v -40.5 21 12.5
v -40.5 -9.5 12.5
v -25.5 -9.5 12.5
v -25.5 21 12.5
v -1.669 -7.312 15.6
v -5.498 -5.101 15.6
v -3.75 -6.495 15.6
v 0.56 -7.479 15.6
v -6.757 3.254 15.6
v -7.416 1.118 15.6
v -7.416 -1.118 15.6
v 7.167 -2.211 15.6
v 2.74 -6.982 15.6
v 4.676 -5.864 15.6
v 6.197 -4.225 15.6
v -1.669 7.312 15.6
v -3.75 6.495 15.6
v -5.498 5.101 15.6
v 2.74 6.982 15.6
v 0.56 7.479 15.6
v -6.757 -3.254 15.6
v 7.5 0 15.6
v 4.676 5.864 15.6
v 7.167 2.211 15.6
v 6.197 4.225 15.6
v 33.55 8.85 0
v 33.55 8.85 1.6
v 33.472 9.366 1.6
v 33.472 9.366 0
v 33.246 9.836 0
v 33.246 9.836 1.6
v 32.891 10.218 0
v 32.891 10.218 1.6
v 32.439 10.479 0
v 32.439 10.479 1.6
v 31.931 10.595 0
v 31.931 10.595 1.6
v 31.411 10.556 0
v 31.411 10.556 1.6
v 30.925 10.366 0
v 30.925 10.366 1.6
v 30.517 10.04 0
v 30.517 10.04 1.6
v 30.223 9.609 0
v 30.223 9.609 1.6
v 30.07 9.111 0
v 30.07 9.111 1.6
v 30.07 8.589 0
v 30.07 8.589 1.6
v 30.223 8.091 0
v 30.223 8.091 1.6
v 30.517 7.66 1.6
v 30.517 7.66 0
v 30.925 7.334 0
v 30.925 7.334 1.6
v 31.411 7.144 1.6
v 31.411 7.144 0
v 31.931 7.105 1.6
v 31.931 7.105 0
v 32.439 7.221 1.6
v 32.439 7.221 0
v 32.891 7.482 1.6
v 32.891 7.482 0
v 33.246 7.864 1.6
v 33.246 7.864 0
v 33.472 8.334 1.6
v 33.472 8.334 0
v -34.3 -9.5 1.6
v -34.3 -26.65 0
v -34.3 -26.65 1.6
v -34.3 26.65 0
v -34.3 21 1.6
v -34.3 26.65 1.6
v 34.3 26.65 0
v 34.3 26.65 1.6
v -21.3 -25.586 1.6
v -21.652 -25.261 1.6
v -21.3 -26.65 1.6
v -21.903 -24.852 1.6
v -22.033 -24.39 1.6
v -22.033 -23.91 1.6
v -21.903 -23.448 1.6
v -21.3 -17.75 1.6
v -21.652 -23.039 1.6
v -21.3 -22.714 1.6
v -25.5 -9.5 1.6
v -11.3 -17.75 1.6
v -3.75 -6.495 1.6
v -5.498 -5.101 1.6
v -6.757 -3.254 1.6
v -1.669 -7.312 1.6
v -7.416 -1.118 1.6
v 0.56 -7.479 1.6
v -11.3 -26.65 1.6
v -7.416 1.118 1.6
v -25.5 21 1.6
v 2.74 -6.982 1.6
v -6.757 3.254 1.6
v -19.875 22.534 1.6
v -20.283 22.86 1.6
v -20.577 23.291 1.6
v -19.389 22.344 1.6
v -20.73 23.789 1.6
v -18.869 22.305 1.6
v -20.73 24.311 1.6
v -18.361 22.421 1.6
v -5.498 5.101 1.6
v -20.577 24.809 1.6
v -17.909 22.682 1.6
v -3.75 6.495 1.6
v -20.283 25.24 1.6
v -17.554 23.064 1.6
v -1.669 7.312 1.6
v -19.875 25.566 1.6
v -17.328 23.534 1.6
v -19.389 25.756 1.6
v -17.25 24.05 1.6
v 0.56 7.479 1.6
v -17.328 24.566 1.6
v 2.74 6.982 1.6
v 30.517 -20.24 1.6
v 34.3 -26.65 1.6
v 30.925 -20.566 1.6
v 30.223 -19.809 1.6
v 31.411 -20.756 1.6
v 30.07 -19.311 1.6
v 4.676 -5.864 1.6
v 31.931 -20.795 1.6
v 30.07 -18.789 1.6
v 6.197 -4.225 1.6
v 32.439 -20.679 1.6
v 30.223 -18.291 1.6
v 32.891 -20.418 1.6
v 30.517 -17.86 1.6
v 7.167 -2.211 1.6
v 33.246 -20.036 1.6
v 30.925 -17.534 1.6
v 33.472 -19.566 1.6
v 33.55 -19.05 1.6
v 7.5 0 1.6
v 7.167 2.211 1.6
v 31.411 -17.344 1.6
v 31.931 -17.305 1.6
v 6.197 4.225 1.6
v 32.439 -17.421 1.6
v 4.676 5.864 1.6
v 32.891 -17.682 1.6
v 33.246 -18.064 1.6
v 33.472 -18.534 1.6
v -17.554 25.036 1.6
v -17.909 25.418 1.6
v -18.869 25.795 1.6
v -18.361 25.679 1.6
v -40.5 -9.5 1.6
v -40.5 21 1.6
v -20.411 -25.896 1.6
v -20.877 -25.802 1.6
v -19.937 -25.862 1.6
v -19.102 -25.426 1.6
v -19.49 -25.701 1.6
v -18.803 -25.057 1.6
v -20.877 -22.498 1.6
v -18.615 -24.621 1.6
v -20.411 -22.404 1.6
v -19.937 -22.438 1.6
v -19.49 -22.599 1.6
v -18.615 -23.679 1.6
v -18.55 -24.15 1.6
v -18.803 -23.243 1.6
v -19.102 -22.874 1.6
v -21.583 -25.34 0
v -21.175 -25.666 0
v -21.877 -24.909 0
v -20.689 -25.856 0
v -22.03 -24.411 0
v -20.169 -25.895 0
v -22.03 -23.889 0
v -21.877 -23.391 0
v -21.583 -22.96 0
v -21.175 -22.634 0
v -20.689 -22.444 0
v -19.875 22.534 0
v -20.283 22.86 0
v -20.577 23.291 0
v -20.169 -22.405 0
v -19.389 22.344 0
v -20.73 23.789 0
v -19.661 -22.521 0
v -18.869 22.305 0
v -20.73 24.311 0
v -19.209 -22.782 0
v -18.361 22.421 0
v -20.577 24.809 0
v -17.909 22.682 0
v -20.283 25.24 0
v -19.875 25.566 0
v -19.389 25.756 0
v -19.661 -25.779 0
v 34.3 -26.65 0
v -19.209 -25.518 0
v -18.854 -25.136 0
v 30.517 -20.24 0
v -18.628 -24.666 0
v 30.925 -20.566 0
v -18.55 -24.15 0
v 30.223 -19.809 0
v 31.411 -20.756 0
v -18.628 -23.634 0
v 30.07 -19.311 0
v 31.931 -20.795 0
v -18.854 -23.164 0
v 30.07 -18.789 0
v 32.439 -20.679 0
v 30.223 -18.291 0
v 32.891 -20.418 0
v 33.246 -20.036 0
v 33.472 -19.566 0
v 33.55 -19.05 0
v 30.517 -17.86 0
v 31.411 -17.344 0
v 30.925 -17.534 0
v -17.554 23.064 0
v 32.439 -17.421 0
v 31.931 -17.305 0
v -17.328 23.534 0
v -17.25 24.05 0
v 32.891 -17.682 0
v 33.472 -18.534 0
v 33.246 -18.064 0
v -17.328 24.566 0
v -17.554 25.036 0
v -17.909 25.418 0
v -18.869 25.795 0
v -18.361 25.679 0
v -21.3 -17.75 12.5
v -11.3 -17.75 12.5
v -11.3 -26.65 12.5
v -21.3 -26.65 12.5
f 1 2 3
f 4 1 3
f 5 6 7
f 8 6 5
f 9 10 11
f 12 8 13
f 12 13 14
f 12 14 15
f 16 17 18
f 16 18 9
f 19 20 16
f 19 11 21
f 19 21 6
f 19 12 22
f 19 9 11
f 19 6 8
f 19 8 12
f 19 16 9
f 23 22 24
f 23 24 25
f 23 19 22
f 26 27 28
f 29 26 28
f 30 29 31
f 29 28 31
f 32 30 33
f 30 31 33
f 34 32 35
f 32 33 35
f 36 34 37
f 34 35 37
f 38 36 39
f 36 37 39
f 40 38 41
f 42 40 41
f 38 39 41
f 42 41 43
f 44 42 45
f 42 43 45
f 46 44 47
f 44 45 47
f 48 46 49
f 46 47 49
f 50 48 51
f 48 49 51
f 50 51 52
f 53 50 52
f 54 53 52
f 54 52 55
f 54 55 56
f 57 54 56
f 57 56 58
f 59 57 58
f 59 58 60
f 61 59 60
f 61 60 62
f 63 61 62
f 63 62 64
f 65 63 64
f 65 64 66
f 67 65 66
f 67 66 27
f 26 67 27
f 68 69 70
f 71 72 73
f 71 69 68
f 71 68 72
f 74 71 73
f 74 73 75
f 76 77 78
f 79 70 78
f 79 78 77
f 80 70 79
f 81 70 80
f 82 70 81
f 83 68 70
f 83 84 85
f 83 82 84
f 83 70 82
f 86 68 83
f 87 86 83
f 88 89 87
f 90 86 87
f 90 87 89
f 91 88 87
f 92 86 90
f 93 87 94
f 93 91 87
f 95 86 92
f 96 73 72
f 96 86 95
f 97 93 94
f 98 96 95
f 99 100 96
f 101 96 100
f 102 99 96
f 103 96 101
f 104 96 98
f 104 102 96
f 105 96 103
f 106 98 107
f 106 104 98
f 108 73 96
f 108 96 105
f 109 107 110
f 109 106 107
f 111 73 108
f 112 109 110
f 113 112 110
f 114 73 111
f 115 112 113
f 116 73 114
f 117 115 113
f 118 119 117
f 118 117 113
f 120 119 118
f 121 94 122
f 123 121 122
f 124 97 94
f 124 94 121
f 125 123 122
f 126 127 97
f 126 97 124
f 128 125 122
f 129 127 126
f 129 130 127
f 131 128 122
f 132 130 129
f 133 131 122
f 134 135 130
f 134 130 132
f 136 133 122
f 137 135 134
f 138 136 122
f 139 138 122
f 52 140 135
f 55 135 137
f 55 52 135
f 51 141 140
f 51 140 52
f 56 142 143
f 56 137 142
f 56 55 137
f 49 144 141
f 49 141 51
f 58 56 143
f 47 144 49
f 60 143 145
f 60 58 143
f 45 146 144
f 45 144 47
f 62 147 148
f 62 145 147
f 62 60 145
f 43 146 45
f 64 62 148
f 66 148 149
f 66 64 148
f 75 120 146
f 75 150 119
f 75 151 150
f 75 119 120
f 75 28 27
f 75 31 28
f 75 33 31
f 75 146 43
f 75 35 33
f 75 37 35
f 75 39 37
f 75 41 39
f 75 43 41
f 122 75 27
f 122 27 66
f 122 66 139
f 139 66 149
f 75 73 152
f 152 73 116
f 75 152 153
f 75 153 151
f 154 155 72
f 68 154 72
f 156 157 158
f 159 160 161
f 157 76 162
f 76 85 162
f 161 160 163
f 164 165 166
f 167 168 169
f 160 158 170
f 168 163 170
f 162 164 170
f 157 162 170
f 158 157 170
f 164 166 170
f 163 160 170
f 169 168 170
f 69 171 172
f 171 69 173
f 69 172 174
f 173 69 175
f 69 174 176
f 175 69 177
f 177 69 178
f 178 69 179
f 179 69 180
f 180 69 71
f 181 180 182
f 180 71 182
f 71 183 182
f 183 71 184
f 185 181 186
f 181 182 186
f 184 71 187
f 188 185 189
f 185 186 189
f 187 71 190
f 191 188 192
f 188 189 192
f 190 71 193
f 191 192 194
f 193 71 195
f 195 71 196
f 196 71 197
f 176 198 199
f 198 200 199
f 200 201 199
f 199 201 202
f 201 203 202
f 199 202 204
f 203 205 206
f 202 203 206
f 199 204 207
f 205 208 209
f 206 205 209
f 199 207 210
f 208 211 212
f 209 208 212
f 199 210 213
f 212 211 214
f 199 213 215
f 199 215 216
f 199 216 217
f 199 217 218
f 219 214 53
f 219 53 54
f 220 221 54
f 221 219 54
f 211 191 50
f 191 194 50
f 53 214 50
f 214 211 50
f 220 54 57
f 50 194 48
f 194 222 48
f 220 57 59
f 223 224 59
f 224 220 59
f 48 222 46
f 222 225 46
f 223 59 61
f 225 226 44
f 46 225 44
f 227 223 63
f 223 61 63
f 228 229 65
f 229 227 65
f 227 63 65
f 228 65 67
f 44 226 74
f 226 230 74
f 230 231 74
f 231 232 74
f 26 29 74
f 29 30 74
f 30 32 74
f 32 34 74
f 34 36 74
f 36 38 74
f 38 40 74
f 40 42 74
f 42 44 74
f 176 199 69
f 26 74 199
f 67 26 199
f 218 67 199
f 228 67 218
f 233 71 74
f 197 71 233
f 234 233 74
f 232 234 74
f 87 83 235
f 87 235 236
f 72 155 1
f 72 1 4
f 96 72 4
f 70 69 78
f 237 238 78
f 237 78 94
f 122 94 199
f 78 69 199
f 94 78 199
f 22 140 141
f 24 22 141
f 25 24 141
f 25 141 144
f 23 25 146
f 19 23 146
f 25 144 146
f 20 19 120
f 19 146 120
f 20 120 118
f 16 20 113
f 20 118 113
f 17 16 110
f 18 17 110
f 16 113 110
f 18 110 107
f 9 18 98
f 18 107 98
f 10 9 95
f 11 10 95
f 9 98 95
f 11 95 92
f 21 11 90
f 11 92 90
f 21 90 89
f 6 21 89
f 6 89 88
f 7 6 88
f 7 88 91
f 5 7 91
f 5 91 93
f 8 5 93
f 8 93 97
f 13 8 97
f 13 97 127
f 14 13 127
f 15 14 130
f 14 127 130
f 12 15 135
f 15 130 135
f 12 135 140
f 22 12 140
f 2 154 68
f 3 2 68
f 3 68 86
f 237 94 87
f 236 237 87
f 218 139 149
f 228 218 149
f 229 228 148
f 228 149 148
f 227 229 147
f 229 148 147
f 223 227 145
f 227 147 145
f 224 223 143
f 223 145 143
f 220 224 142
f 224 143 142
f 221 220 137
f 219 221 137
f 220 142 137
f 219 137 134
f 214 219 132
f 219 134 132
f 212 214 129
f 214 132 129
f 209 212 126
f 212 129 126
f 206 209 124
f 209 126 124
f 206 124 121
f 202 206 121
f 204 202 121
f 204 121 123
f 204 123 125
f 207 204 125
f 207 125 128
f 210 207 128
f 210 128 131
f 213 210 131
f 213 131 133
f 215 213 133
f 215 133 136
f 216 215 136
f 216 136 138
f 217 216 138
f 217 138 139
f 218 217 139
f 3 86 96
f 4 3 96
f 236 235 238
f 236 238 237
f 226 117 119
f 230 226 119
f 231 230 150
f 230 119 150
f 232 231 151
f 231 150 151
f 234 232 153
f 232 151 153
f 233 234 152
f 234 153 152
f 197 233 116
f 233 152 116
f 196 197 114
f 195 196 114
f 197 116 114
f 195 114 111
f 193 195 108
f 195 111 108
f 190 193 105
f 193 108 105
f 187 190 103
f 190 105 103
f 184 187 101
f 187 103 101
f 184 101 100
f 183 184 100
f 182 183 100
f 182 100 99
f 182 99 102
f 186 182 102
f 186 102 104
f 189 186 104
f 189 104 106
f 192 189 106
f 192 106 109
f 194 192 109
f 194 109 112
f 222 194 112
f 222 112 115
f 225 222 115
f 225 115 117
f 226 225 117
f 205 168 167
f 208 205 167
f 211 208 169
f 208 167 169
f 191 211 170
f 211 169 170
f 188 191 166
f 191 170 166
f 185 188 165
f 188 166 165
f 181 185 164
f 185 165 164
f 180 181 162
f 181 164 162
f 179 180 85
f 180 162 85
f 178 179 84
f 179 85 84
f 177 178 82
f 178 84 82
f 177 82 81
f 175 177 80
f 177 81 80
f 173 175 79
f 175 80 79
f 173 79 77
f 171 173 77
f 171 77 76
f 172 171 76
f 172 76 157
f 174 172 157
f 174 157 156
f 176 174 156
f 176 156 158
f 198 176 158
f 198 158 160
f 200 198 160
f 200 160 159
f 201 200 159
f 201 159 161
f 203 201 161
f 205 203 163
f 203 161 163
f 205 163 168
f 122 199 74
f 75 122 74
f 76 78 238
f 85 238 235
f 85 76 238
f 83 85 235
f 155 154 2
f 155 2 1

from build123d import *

# Parameters (mm, degrees)
SKETCH1_W           = 68.6
SKETCH1_H           = 53.3
BOSS_EXTRUDE1_DEPTH = 1.6
SKETCH2_W           = 15
SKETCH2_H           = 30.5
SKETCH2_W_2         = 10
SKETCH2_H_2         = 8.9
BOSS_EXTRUDE2_DEPTH = 10.9
SKETCH3_R           = 1.75
CUT_EXTRUDE1_DEPTH  = 2.6
SKETCH4_R           = 7.5
BOSS_EXTRUDE3_DEPTH = 14


with BuildPart() as part:
    # Sketch1 → Boss-Extrude1 (new body)
    with BuildSketch(Plane.XY):
        Rectangle(SKETCH1_W, SKETCH1_H)
    extrude(amount=BOSS_EXTRUDE1_DEPTH)

    # Sketch2 → Boss-Extrude2 (add)
    with BuildSketch(Plane.XY.offset(1.6)):
        with Locations((-33, 5.75)):
            Rectangle(SKETCH2_W, SKETCH2_H)
        with Locations((-16.3, -22.2)):
            Rectangle(SKETCH2_W_2, SKETCH2_H_2)
    extrude(amount=BOSS_EXTRUDE2_DEPTH)

    # Sketch3 → Cut-Extrude1 (cut, through all)
    with BuildSketch(Plane.XY.offset(1.6)):
        with Locations((-19, 24.05)):
            Circle(SKETCH3_R)
        with Locations((-20.3, -24.15)):
            Circle(SKETCH3_R)
        with Locations((31.8, -19.05)):
            Circle(SKETCH3_R)
        with Locations((31.8, 8.85)):
            Circle(SKETCH3_R)
    extrude(amount=-CUT_EXTRUDE1_DEPTH, mode=Mode.SUBTRACT)

    # Sketch4 → Boss-Extrude3 (add)
    with BuildSketch(Plane.XY.offset(1.6)):
        Circle(SKETCH4_R)
    extrude(amount=BOSS_EXTRUDE3_DEPTH)


solid = part.part
